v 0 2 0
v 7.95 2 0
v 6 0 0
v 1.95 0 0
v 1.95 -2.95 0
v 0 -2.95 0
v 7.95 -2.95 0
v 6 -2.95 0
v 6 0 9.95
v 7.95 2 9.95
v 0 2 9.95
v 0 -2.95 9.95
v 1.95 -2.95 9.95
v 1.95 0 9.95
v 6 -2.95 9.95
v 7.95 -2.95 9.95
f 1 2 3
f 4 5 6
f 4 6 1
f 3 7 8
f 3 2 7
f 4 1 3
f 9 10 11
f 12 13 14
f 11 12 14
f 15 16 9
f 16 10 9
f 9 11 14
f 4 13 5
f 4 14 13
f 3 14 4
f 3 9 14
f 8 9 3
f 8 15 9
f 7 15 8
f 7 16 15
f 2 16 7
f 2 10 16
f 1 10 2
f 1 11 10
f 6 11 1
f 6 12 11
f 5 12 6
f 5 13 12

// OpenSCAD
// file: ../jars/jar-rectangular-99x48.scad
function jar_height() = 99; // millimeters
function jar_width() = 48;
function jar_round_edge_radius() = 12;

module jar() {
    linear_extrude(height = jar_height())
    hull() {
        translate([jar_round_edge_radius(), jar_round_edge_radius()]) circle(r = jar_round_edge_radius());
        translate([jar_width() - jar_round_edge_radius(), jar_round_edge_radius()]) circle(r = jar_round_edge_radius());
        translate([jar_width() - jar_round_edge_radius(), jar_width() - jar_round_edge_radius()]) circle(r = jar_round_edge_radius());
        translate([jar_round_edge_radius(), jar_width() - jar_round_edge_radius()]) circle(r = jar_round_edge_radius());
    }
}

jar();
// file: ../drawers/drawer-780x470x255.scad
// These are the usable inner dimension of the drawer.
function drawer_inner_depth() = 471; // millimeters
function drawer_inner_width() = 780;
function drawer_inner_front_height() = 255;
function drawer_inner_back_height() = 160;
function drawer_inner_height() = max(drawer_inner_front_height(), drawer_inner_back_height());

function drawer_side_wall_thickness() = 15; // Does not matter in regards to usable space

module drawer_bottom() {
    width = drawer_inner_width() + 2* drawer_side_wall_thickness();
    height = drawer_side_wall_thickness();
    depth = drawer_inner_depth() + 2* drawer_side_wall_thickness();

    // make the innner space of the drawer aligned with coordinates [0,0,0]
    offset_x = -drawer_side_wall_thickness();
    offset_y = -drawer_side_wall_thickness();
    offset_z = -drawer_side_wall_thickness();

    translate([offset_x, offset_y, offset_z]) cube([width, depth, height]);
}

module drawer_front() {
    width = drawer_inner_width() + 2* drawer_side_wall_thickness();
    height = drawer_inner_height();
    depth = drawer_side_wall_thickness();

    offset_x = -drawer_side_wall_thickness();
    offset_y = -drawer_side_wall_thickness();
    offset_z = -drawer_side_wall_thickness();

    handle_width = 160;
    handle_depth = 20;
    handle_height = 20;

    // make the innner space of the drawer aligned with coordinates [0,0,0]
    handle_offset_x = offset_x + width / 2 - handle_width / 2;
    handle_offset_y = offset_y - handle_depth;
    handle_offset_z = offset_z + height / 2 - handle_height / 2;

    union() {
        // front panel
        translate([offset_x, offset_y, offset_z]) cube([width, depth, height]);
        translate([handle_offset_x, handle_offset_y, handle_offset_z]) {
            cube([handle_width, handle_depth, handle_height]);
        }
    }
}

module drawer_side(s = "left") {
    width = drawer_side_wall_thickness();
    height = drawer_inner_height();
    depth = drawer_inner_depth() + 2* drawer_side_wall_thickness();

    offset_y = -drawer_side_wall_thickness();
    offset_z = -drawer_side_wall_thickness();
    if (s == "right") {
        offset_x = drawer_inner_width() + drawer_side_wall_thickness();
        translate([offset_x, offset_y, offset_z]) cube([width, depth, height]);
    } else {
        offset_x = -drawer_side_wall_thickness();
        translate([offset_x, offset_y, offset_z]) cube([width, depth, height]);
    }
}

module drawer_back() {
    width = drawer_inner_width() + 2* drawer_side_wall_thickness();
    height = drawer_inner_back_height();
    depth = drawer_side_wall_thickness();

    offset_x = -drawer_side_wall_thickness();
    offset_y = drawer_inner_depth();
    offset_z = -drawer_side_wall_thickness();

    translate([offset_x, offset_y, offset_z]) cube([width, depth, height]);
}

module drawer() {
    union() {
        drawer_bottom();
        drawer_front();
        drawer_side(s = "left");
        drawer_side(s = "right");
        drawer_back();
    }
}

drawer();
// file: organizer-drawer_780x470x255-jar_99x48.scad
use <../drawers/drawer-780x470x255.scad>;
use <../jars/jar-rectangular-99x48.scad>;

function side_wall_minimum_thickness() = 2;
function foot_wall_minimum_thickness() = side_wall_minimum_thickness();
function organizer_width() = jar_width() + side_wall_minimum_thickness() * 2;
function side_length() = jar_height() + side_wall_minimum_thickness();
function side_height() = jar_round_edge_radius();

function column_attachment_slot_width() = 5;
function column_attachment_slot_depth() = 3;
function column_attachment_pin_loose_fit() = 0.05;

function row_attachment_slot_length() = 10;
function row_attachment_slot_width() = 2;
function row_attachment_slot_depth() = 3;
function row_attachment_distance_from_edge() = 2;

function row_attachment_pin_wall_thickness() = side_wall_minimum_thickness();
function row_attachment_pin_loose_fit() = 0.05;
function row_attachment_pin_width() = row_attachment_distance_from_edge() * 4 - row_attachment_pin_loose_fit();

module row_attachment_slot() {
    diff_workaround = 0.1;

    offset_x = row_attachment_distance_from_edge();
    offset_y = - diff_workaround;
    offset_z = side_length() / 2 - row_attachment_slot_length() / 2;
    depth = row_attachment_slot_depth() + diff_workaround;

    translate([offset_x, offset_y, offset_z]) cube([row_attachment_slot_width(), depth, row_attachment_slot_length()]);

    other_side_offset_x = organizer_width() - row_attachment_distance_from_edge() - row_attachment_slot_width();
    translate([other_side_offset_x, offset_y, offset_z]) cube([row_attachment_slot_width(), depth, row_attachment_slot_length()]);
}

module row_attachment_pin() {
    length = row_attachment_slot_length() - row_attachment_pin_loose_fit();
    depth = row_attachment_slot_depth() - row_attachment_pin_loose_fit();
    width = row_attachment_slot_width() - row_attachment_pin_loose_fit();

    linear_extrude(length) {
        union() {
            square([row_attachment_pin_width(), row_attachment_pin_wall_thickness()]);
            translate([0, - depth]) square([width, depth]);
            translate([row_attachment_pin_width() - width, - depth]) square([width, depth]);
        }
    }
}

// aligned with the actual organizer row attachment slot for easier previewing
module row_attachment_pin_aligned() {
    pin_offset_x = organizer_width() - row_attachment_pin_width() / 2 - side_wall_minimum_thickness();
    pin_offset_y = organizer_width() - row_attachment_pin_wall_thickness();
    pin_offset_z = side_length() / 2 - row_attachment_slot_length() / 2 - foot_wall_minimum_thickness();
    translate([pin_offset_x, pin_offset_y, pin_offset_z])
        row_attachment_pin();
}

module organizer_side(ol = 0) {
    diff_workaround = 0.1;

    difference() {
        linear_extrude(side_length())
        difference() {
            square([organizer_width(), side_height() + side_wall_minimum_thickness()]);
            translate([jar_round_edge_radius() + side_wall_minimum_thickness(), jar_round_edge_radius() + side_wall_minimum_thickness()])circle(jar_round_edge_radius());
            translate([jar_width() - jar_round_edge_radius() + side_wall_minimum_thickness(), jar_round_edge_radius() + side_wall_minimum_thickness()])circle(jar_round_edge_radius());
            translate([side_wall_minimum_thickness() + jar_round_edge_radius(), side_wall_minimum_thickness()]) square([jar_width() - 2 * jar_round_edge_radius(), side_height()]);
        }

        if (ol > 0) {
            offset_z = side_length() - ol - foot_wall_minimum_thickness();
            translate([- diff_workaround, - diff_workaround, offset_z]) cube([column_attachment_slot_width() + diff_workaround, column_attachment_slot_depth() + diff_workaround, foot_wall_minimum_thickness()]);

            offset_x = organizer_width() - column_attachment_slot_width() + diff_workaround;
            translate([offset_x, - diff_workaround, offset_z]) cube([column_attachment_slot_width() + diff_workaround, column_attachment_slot_depth() + diff_workaround, foot_wall_minimum_thickness()]);
        }

        row_attachment_slot();
    }
}

module organizer_foot(lf = 0, ol = 0, fp = false) {
    pin_width = column_attachment_slot_width() - column_attachment_pin_loose_fit();
    pin_depth = column_attachment_slot_depth() - column_attachment_pin_loose_fit();
    pin_thickness = foot_wall_minimum_thickness() - column_attachment_pin_loose_fit();

    pin_offset_y = organizer_width() + lf;
    pin_offset_x = organizer_width() - pin_width;
    pin_offset_z = column_attachment_pin_loose_fit() / 2;

    union() {
        cube([organizer_width(), organizer_width() + lf, foot_wall_minimum_thickness()]);
        if (fp) {
            translate([0, pin_offset_y, pin_offset_z]) cube([pin_width, pin_depth, pin_thickness]);
            translate([pin_offset_x, pin_offset_y, pin_offset_z]) cube([pin_width, pin_depth, pin_thickness]);
        }
    }
}

module organizer(
    ol = 0, // overlap - used to determine where the foot of the next organizer will attach to the side of the current one
    lf = 0, // loose fit - distance between two organizers so it is easy to slide in jar into overlapping organizers
    fp = false, // add attachment pins to foot
) {
    translate([jar_width() + side_wall_minimum_thickness(), jar_width() + side_wall_minimum_thickness(), -side_wall_minimum_thickness()])
    rotate([0, 0, 180])
    difference() {
        union() {
            organizer_side(ol);
            organizer_foot(lf = lf, ol = ol, fp = fp);
        }
    }
}

organizer(lf = 3, ol = 18, fp = true);
// main file
use <organizer-drawer_780x470x255-jar_99x48.scad>;

row_attachment_pin();
